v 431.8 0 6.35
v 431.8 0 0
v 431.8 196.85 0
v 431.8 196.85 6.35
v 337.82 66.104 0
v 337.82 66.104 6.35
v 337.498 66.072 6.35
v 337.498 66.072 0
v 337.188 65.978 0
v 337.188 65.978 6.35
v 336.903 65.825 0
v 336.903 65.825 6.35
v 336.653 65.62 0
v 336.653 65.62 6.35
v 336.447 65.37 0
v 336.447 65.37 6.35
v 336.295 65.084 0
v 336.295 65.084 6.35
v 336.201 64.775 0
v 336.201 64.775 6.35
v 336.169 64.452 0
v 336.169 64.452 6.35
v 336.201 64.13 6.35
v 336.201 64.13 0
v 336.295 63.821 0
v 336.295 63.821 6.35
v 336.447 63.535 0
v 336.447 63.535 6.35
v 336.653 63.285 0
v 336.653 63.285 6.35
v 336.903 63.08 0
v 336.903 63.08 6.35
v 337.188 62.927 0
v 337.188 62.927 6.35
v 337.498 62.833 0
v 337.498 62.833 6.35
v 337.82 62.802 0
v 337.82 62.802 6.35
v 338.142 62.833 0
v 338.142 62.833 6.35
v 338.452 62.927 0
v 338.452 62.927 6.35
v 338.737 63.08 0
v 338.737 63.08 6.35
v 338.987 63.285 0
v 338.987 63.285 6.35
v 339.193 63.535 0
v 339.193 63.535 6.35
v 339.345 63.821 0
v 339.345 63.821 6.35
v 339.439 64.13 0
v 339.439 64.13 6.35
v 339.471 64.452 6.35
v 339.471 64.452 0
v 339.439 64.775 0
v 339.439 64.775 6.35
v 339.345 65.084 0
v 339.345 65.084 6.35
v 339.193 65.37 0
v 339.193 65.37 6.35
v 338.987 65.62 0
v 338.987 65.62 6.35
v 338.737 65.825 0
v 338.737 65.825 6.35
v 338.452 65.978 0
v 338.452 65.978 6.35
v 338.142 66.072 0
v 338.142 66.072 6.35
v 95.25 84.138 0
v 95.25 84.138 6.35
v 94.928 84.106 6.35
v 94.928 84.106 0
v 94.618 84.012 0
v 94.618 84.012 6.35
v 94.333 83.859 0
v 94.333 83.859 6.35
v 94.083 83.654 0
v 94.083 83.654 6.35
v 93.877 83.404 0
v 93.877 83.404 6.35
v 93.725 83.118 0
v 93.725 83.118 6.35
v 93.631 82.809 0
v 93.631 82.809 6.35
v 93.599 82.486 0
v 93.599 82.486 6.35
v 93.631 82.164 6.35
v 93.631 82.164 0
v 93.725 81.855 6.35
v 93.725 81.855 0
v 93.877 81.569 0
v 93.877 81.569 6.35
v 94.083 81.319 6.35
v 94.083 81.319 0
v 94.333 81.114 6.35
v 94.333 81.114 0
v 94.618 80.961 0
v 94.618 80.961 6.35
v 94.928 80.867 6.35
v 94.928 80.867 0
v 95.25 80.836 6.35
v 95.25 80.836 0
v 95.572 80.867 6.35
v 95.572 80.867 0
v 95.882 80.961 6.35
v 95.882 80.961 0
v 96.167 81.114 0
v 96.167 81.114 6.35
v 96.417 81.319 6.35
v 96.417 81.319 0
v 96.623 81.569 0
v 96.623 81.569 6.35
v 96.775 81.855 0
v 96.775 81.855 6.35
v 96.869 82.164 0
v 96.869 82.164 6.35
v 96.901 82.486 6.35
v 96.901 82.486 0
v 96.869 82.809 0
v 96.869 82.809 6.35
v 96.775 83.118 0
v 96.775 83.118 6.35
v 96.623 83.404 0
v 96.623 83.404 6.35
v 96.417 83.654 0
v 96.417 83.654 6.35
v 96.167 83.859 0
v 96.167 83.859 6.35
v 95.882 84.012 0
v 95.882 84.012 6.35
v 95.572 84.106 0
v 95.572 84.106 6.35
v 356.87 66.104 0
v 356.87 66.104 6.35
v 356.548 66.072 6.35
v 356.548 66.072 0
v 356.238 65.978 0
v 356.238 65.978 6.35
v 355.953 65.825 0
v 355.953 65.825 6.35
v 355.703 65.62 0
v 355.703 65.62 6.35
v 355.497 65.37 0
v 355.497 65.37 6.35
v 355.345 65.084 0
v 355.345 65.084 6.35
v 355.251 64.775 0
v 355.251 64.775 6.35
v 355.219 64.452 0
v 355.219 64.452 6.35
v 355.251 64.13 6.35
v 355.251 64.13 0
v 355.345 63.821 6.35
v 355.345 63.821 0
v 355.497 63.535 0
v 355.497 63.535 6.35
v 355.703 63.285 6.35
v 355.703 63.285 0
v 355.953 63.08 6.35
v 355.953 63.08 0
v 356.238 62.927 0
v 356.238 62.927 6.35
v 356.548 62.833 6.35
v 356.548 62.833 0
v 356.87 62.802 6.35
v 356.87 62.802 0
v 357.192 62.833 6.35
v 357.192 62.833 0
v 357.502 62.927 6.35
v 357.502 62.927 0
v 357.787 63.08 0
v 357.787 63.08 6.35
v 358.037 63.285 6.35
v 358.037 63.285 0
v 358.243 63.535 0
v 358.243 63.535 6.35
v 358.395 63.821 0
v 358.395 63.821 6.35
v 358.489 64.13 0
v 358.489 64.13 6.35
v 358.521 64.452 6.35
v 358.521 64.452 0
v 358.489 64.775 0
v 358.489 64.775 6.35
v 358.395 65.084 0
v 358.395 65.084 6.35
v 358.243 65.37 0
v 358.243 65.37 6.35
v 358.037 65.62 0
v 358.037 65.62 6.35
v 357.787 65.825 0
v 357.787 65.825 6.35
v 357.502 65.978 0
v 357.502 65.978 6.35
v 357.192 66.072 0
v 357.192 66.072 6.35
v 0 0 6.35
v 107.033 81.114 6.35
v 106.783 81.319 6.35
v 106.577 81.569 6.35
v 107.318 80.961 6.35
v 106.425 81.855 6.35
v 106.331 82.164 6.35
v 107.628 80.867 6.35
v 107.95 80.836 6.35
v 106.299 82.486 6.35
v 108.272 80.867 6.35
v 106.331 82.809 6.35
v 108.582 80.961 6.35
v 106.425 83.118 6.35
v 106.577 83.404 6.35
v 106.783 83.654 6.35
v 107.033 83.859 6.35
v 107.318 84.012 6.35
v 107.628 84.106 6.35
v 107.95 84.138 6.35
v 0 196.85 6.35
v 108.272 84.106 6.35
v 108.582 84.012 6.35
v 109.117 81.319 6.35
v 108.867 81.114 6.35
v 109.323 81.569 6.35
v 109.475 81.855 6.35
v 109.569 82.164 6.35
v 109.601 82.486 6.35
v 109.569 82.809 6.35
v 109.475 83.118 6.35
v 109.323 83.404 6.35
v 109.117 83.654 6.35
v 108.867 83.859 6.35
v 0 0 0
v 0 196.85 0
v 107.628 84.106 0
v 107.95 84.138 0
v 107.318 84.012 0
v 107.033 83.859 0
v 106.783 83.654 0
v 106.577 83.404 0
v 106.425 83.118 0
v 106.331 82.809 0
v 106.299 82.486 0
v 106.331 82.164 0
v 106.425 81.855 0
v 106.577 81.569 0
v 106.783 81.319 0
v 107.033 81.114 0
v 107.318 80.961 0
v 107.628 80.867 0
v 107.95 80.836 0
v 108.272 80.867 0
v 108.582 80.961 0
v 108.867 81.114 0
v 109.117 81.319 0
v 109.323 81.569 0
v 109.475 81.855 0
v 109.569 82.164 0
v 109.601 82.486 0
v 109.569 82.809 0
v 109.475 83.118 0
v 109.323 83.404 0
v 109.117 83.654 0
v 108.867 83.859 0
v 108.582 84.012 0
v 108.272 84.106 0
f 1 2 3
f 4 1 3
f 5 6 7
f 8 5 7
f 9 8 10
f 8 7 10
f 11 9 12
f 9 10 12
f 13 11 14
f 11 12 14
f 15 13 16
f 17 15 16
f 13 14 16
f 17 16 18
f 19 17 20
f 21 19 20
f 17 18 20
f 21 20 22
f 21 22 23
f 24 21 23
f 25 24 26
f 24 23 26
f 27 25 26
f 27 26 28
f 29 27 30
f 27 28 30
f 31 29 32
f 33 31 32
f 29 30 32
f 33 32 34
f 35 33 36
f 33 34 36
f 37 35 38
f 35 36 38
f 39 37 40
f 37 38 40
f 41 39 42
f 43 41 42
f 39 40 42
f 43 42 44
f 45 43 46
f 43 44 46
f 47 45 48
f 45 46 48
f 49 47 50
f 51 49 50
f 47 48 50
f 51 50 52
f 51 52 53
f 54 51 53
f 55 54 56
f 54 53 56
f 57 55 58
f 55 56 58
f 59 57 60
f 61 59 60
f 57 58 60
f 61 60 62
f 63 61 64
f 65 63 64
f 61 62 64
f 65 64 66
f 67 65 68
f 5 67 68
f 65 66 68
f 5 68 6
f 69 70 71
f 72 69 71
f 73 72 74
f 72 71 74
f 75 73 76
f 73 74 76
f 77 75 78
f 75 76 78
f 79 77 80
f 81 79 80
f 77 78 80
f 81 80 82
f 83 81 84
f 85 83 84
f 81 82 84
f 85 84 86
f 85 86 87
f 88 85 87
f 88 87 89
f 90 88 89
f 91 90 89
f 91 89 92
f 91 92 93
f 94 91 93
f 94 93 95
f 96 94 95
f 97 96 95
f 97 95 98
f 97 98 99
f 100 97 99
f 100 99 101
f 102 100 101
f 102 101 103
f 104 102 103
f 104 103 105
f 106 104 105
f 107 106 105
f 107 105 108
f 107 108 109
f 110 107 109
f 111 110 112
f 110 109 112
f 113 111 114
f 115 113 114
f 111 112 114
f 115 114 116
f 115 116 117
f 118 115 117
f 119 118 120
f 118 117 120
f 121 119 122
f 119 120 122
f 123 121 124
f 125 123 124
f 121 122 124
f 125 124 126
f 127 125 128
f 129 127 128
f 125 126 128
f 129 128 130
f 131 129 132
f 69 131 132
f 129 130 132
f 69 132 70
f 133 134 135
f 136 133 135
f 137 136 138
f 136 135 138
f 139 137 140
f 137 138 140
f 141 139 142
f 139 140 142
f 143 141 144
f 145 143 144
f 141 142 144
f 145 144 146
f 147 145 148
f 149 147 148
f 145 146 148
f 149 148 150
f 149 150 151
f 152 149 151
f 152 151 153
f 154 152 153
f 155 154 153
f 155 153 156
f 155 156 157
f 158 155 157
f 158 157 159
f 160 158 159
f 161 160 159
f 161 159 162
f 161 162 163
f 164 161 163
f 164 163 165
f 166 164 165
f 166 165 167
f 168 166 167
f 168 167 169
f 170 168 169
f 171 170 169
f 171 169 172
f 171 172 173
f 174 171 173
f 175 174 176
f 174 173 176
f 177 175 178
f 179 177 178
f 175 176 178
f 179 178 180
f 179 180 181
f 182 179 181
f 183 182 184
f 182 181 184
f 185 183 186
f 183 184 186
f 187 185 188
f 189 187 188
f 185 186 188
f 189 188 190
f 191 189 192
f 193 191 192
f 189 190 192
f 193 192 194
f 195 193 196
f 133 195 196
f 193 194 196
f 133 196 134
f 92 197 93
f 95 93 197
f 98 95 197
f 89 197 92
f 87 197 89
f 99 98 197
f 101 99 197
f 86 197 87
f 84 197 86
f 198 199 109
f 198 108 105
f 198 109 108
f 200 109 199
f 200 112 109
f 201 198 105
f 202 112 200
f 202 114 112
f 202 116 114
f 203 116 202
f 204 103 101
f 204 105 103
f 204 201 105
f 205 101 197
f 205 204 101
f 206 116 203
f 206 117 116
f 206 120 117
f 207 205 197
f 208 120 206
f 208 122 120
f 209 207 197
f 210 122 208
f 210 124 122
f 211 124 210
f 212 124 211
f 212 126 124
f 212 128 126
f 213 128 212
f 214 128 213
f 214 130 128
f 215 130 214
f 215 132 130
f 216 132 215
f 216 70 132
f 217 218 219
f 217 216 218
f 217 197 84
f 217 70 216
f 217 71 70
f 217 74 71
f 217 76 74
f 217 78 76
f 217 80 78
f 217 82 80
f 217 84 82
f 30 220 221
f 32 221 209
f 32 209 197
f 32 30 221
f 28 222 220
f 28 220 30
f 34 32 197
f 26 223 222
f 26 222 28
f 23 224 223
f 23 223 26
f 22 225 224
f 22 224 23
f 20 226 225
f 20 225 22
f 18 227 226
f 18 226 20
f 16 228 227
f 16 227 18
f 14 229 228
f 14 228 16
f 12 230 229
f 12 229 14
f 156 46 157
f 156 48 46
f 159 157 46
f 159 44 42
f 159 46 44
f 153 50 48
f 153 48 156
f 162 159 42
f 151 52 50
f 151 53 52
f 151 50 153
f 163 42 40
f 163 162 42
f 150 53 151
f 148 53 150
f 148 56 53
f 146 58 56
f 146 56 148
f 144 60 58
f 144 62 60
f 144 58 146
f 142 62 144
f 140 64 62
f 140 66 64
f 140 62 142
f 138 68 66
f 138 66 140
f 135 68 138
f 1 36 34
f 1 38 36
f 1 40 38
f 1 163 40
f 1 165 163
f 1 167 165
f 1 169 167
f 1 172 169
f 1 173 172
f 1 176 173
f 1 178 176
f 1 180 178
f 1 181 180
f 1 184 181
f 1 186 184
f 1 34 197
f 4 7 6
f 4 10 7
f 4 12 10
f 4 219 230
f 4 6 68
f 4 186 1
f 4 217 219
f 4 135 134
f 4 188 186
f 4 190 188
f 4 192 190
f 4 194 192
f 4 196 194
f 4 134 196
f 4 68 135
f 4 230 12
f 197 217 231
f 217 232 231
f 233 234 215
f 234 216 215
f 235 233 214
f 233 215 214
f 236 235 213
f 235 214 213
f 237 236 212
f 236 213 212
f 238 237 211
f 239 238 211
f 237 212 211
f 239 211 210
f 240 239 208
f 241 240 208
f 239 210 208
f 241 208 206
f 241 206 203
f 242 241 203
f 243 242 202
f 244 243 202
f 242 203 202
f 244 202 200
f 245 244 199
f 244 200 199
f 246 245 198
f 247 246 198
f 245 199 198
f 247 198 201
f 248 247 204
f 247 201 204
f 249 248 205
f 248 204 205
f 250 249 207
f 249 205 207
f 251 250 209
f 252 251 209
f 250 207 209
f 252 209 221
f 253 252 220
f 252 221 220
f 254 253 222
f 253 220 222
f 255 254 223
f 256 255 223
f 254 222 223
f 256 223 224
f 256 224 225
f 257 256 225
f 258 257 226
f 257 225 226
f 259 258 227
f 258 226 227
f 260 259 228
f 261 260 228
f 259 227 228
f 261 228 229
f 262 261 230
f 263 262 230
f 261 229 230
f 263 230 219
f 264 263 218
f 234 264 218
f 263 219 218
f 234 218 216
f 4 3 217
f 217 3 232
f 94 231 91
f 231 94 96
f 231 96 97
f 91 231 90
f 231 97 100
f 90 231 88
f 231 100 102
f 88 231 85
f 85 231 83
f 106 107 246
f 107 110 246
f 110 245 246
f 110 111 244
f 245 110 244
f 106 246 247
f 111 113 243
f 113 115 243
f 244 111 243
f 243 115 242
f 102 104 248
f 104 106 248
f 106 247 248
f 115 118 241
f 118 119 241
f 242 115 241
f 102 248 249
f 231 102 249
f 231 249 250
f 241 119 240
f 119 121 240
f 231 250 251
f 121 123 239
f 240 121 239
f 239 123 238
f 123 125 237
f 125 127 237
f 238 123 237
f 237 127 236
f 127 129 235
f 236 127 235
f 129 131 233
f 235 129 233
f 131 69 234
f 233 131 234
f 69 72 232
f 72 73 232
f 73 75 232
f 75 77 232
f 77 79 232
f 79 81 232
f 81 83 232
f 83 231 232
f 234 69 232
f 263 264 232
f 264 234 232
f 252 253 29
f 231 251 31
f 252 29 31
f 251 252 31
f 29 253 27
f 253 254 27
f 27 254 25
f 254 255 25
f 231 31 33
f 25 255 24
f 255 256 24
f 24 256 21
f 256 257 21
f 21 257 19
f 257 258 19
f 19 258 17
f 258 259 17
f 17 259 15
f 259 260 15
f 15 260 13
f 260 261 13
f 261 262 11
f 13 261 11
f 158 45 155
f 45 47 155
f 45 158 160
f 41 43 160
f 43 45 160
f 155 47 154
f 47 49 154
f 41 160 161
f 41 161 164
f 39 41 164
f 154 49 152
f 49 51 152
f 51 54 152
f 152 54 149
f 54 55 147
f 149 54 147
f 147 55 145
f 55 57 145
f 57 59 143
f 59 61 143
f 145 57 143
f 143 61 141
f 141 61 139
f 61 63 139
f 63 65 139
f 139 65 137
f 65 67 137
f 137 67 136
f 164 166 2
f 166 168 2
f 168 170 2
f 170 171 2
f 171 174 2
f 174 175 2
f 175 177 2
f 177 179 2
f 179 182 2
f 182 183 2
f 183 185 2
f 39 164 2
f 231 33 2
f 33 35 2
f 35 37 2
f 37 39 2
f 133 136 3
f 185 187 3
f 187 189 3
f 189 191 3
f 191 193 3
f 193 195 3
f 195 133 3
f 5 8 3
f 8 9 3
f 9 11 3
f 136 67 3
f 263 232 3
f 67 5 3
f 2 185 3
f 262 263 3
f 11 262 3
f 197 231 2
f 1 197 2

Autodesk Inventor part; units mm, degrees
ref_plane "YZ Plane" through (0, 0, 0) normal (1, 0, 0) x (0, 1, 0)
ref_plane "XZ Plane" through (0, 0, 0) normal (0, 1, 0) x (-1, 0, 0)
ref_plane "XY Plane" through (0, 0, 0) normal (0, 0, 1) x (1, 0, 0)
sketch "Sketch1" plane through (0, 0, 0) normal (0, 0, 1) x (1, 0, 0)
  line L0 (0, 0) -> (431.8, 0)
  line L1 (431.8, 0) -> (431.8, 152.4)
  line L2 (431.8, 152.4) -> (0, 152.4)
  line L3 (0, 152.4) -> (0, 0)
  dimension "d0" = 431.8
  dimension "d1" = 152.4
extrude "Extrusion1" add sketch "Sketch1" along normal blind 6.35
thicken "Thicken1" operation add thickness 44.45 both sides no extend neighbours yes toward (0, 1, 0) faces at (287.8667, 152.4, 4.2333)
sketch "Sketch3" plane through (0, 0, 0) normal (0, 0, -1) x (-1, 0, 0)
  line L0 (0, 196.85) -> (0, 0) projected
  line L1 (0, 0) -> (-431.8, 0) projected
  line L2 (-88.9, 0) -> (-88.9, 77.724)
  line L3 (-88.9, 0) -> (-11.176, 0) construction
  line L4 (-88.9, 77.724) -> (0, 77.724)
  line L5 (0, 196.85) -> (0, 0) projected
  line L6 (-88.9, 77.724) -> (-114.3, 77.724)
  line L7 (-114.3, 77.724) -> (-114.3, 87.249)
  line L8 (-114.3, 87.249) -> (-88.9, 87.249)
  line L9 (-88.9, 87.249) -> (-88.9, 77.724)
  line L10 (-88.9, 82.4865) -> (-95.25, 82.4865)
  line L11 (-114.3, 82.4865) -> (-107.95, 82.4865)
  dimension "d8" = 77.724
  dimension "d9" = 90
  dimension "d10" = 88.9
  dimension "d11" = 25.4
  dimension "d12" = 9.525
  dimension "d13" = 6.35
  dimension "d14" = 6.35
hole "Hole1" at (107.95, 82.4865, 0) at (95.25, 82.4865, 0) direction (0, 0, 1) diameter 3.302 depth 25.4 tip angle 118
sketch "Sketch5" plane through (0, 0, 0) normal (0, 0, -1) x (-1, 0, 0)
  line L0 (-431.8, 0) -> (-431.8, 196.85) projected
  line L1 (-431.8, 59.69) -> (-369.57, 59.69)
  line L2 (-431.8, 59.69) -> (-369.57, 59.69) construction
  line L3 (0, 0) -> (-431.8, 0) projected
  line L4 (-369.57, 0) -> (-369.57, 59.69)
  line L5 (-369.57, 0) -> (-309.88, 0) construction
  line L6 (-369.57, 59.69) -> (-325.12, 59.69)
  line L7 (-325.12, 59.69) -> (-325.12, 69.215)
  line L8 (-325.12, 69.215) -> (-369.57, 69.215)
  line L9 (-369.57, 69.215) -> (-369.57, 59.69)
  line L10 (-369.57, 64.4525) -> (-356.87, 64.4525)
  line L11 (-325.12, 64.4525) -> (-337.82, 64.4525)
  dimension "d22" = 62.23
  dimension "d23" = 0
  dimension "d24" = 59.69
  dimension "d25" = 90
  dimension "d26" = 0
  dimension "d27" = 44.45
  dimension "d28" = 9.525
  dimension "d29" = 12.7
  dimension "d30" = 12.7
hole "Hole2" at (356.87, 64.4525, 0) at (337.82, 64.4525, 0) direction (0, 0, 1) diameter 3.302 depth 25.4 tip angle 118
properties part number "PossibleTopPlate"
